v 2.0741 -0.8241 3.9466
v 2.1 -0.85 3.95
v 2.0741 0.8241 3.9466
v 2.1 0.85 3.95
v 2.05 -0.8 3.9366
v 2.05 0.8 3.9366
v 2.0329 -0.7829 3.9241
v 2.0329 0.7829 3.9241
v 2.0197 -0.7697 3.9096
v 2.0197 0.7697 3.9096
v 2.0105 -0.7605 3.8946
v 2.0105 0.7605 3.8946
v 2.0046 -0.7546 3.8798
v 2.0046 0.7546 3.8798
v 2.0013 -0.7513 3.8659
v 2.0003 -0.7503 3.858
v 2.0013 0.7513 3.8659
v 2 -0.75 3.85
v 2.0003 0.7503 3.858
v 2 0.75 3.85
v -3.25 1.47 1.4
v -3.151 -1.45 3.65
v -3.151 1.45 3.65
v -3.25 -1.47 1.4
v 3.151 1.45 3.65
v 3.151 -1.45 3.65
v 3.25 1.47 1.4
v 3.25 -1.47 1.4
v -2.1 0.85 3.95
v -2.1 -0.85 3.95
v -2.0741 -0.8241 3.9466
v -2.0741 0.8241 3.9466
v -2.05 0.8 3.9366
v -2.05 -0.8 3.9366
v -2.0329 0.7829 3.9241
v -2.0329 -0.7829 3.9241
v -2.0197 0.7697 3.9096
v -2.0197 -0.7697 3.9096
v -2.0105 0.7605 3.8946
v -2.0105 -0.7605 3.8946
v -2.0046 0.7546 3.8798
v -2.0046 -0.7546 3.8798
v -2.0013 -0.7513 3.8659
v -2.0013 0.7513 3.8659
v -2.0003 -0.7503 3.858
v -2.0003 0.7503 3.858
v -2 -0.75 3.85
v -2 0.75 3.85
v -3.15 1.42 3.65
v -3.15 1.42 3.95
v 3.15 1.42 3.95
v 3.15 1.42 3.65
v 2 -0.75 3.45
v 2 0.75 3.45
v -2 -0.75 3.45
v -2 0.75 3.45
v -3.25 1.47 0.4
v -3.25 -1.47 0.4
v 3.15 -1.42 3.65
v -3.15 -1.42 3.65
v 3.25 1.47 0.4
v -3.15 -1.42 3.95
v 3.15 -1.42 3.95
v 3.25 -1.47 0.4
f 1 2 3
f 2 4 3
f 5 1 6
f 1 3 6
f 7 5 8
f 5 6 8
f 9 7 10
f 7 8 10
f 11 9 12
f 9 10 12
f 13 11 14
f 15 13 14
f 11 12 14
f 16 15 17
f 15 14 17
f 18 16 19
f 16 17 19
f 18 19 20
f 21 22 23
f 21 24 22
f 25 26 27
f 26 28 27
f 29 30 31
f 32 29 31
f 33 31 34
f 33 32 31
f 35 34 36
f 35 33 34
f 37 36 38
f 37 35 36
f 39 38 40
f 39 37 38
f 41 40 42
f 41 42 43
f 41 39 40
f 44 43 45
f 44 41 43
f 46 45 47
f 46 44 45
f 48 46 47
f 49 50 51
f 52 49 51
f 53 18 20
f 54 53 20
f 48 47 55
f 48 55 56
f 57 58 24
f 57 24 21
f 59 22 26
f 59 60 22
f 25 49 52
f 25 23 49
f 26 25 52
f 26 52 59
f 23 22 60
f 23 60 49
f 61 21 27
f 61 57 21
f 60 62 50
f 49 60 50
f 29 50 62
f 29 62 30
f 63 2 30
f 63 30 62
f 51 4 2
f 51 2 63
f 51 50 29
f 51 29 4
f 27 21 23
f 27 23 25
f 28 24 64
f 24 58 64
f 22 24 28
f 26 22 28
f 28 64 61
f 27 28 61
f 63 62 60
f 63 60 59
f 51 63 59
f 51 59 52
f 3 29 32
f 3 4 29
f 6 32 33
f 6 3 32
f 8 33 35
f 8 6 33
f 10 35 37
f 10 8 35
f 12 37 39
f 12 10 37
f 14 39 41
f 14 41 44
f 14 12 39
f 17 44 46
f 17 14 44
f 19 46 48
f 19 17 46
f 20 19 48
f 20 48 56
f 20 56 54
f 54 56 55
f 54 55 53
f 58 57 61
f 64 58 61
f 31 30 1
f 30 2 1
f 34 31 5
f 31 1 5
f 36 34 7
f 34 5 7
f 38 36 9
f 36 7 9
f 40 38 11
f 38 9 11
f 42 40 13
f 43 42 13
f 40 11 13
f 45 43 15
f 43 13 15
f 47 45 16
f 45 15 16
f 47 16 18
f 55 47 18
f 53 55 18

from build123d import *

# Parameters (mm, degrees)
SKETCH_W         = 6.5
SKETCH_H         = 2.94
PAD_DEPTH        = 3.55
SKETCH001_W      = 6.5
SKETCH001_H      = 2.94
SKETCH001_W_2    = 6.3
SKETCH001_H_2    = 2.84
POCKET_DEPTH     = 0.3
CHAMFER_SIZE2    = 2.25
CHAMFER_SIZE     = 0.099
CHAMFER001_SIZE2 = 2.25
CHAMFER001_SIZE  = 0.099
CHAMFER002_SIZE2 = 2.25
CHAMFER002_SIZE  = 0.02
CHAMFER003_SIZE2 = 2.25
CHAMFER003_SIZE  = 0.02
SKETCH002_W      = 4
SKETCH002_H      = 1.5
POCKET001_DEPTH  = 0.5
FILLET_R         = 0.1


with BuildPart() as part:
    # Sketch → Pad (new body)
    with BuildSketch(Plane.XY):
        Rectangle(SKETCH_W, SKETCH_H)
    extrude(amount=PAD_DEPTH)

    # Sketch001 (on Face6 of Pad) → Pocket (cut)
    with BuildSketch(Plane.XY.offset(3.55)):
        Rectangle(SKETCH001_W, SKETCH001_H)
        Rectangle(SKETCH001_W_2, SKETCH001_H_2, mode=Mode.SUBTRACT)
    extrude(amount=-POCKET_DEPTH, mode=Mode.SUBTRACT)

    # Chamfer
    chamfer_edges = [part.edges().sort_by_distance(p)[0] for p in [
        (-3.25, 0, 3.25),
    ]]
    chamfer_side = part.faces().sort_by_distance((0, -1.462866, 3.25))[0]
    chamfer(chamfer_edges, length=CHAMFER_SIZE, length2=CHAMFER_SIZE2, reference=chamfer_side)

    # Chamfer001
    chamfer001_edges = [part.edges().sort_by_distance(p)[0] for p in [
        (3.25, 0, 3.25),
    ]]
    chamfer001_side = part.faces().sort_by_distance((0.0495, -1.462956, 3.25))[0]
    chamfer(chamfer001_edges, length=CHAMFER001_SIZE, length2=CHAMFER001_SIZE2, reference=chamfer001_side)

    # Chamfer002
    chamfer002_edges = [part.edges().sort_by_distance(p)[0] for p in [
        (0, 1.47, 3.25),
    ]]
    chamfer002_side = part.faces().sort_by_distance((0, -1.463046, 3.25))[0]
    chamfer(chamfer002_edges, length=CHAMFER002_SIZE, length2=CHAMFER002_SIZE2, reference=chamfer002_side)

    # Chamfer003
    chamfer003_edges = [part.edges().sort_by_distance(p)[0] for p in [
        (0, -1.47, 3.25),
    ]]
    chamfer003_side = part.faces().sort_by_distance((0, 1.443054, 3.25))[0]
    chamfer(chamfer003_edges, length=CHAMFER003_SIZE, length2=CHAMFER003_SIZE2, reference=chamfer003_side)

    # Sketch002 (on Face14 of Chamfer003) → Pocket001 (cut)
    with BuildSketch(Plane.XY.offset(3.55)):
        Rectangle(SKETCH002_W, SKETCH002_H)
    extrude(amount=-POCKET001_DEPTH, mode=Mode.SUBTRACT)

    # Fillet
    fillet_edges = [part.edges().sort_by_distance(p)[0] for p in [
        (2, 0, 3.55),
        (0, -0.75, 3.55),
        (0, 0.75, 3.55),
        (-2, 0, 3.55),
    ]]
    fillet(fillet_edges, radius=FILLET_R)


with BuildPart() as part_1:
    # Body placement: moved
    add(part.part.moved(Location((0, 0, 0.4))))


solid = part_1.part
